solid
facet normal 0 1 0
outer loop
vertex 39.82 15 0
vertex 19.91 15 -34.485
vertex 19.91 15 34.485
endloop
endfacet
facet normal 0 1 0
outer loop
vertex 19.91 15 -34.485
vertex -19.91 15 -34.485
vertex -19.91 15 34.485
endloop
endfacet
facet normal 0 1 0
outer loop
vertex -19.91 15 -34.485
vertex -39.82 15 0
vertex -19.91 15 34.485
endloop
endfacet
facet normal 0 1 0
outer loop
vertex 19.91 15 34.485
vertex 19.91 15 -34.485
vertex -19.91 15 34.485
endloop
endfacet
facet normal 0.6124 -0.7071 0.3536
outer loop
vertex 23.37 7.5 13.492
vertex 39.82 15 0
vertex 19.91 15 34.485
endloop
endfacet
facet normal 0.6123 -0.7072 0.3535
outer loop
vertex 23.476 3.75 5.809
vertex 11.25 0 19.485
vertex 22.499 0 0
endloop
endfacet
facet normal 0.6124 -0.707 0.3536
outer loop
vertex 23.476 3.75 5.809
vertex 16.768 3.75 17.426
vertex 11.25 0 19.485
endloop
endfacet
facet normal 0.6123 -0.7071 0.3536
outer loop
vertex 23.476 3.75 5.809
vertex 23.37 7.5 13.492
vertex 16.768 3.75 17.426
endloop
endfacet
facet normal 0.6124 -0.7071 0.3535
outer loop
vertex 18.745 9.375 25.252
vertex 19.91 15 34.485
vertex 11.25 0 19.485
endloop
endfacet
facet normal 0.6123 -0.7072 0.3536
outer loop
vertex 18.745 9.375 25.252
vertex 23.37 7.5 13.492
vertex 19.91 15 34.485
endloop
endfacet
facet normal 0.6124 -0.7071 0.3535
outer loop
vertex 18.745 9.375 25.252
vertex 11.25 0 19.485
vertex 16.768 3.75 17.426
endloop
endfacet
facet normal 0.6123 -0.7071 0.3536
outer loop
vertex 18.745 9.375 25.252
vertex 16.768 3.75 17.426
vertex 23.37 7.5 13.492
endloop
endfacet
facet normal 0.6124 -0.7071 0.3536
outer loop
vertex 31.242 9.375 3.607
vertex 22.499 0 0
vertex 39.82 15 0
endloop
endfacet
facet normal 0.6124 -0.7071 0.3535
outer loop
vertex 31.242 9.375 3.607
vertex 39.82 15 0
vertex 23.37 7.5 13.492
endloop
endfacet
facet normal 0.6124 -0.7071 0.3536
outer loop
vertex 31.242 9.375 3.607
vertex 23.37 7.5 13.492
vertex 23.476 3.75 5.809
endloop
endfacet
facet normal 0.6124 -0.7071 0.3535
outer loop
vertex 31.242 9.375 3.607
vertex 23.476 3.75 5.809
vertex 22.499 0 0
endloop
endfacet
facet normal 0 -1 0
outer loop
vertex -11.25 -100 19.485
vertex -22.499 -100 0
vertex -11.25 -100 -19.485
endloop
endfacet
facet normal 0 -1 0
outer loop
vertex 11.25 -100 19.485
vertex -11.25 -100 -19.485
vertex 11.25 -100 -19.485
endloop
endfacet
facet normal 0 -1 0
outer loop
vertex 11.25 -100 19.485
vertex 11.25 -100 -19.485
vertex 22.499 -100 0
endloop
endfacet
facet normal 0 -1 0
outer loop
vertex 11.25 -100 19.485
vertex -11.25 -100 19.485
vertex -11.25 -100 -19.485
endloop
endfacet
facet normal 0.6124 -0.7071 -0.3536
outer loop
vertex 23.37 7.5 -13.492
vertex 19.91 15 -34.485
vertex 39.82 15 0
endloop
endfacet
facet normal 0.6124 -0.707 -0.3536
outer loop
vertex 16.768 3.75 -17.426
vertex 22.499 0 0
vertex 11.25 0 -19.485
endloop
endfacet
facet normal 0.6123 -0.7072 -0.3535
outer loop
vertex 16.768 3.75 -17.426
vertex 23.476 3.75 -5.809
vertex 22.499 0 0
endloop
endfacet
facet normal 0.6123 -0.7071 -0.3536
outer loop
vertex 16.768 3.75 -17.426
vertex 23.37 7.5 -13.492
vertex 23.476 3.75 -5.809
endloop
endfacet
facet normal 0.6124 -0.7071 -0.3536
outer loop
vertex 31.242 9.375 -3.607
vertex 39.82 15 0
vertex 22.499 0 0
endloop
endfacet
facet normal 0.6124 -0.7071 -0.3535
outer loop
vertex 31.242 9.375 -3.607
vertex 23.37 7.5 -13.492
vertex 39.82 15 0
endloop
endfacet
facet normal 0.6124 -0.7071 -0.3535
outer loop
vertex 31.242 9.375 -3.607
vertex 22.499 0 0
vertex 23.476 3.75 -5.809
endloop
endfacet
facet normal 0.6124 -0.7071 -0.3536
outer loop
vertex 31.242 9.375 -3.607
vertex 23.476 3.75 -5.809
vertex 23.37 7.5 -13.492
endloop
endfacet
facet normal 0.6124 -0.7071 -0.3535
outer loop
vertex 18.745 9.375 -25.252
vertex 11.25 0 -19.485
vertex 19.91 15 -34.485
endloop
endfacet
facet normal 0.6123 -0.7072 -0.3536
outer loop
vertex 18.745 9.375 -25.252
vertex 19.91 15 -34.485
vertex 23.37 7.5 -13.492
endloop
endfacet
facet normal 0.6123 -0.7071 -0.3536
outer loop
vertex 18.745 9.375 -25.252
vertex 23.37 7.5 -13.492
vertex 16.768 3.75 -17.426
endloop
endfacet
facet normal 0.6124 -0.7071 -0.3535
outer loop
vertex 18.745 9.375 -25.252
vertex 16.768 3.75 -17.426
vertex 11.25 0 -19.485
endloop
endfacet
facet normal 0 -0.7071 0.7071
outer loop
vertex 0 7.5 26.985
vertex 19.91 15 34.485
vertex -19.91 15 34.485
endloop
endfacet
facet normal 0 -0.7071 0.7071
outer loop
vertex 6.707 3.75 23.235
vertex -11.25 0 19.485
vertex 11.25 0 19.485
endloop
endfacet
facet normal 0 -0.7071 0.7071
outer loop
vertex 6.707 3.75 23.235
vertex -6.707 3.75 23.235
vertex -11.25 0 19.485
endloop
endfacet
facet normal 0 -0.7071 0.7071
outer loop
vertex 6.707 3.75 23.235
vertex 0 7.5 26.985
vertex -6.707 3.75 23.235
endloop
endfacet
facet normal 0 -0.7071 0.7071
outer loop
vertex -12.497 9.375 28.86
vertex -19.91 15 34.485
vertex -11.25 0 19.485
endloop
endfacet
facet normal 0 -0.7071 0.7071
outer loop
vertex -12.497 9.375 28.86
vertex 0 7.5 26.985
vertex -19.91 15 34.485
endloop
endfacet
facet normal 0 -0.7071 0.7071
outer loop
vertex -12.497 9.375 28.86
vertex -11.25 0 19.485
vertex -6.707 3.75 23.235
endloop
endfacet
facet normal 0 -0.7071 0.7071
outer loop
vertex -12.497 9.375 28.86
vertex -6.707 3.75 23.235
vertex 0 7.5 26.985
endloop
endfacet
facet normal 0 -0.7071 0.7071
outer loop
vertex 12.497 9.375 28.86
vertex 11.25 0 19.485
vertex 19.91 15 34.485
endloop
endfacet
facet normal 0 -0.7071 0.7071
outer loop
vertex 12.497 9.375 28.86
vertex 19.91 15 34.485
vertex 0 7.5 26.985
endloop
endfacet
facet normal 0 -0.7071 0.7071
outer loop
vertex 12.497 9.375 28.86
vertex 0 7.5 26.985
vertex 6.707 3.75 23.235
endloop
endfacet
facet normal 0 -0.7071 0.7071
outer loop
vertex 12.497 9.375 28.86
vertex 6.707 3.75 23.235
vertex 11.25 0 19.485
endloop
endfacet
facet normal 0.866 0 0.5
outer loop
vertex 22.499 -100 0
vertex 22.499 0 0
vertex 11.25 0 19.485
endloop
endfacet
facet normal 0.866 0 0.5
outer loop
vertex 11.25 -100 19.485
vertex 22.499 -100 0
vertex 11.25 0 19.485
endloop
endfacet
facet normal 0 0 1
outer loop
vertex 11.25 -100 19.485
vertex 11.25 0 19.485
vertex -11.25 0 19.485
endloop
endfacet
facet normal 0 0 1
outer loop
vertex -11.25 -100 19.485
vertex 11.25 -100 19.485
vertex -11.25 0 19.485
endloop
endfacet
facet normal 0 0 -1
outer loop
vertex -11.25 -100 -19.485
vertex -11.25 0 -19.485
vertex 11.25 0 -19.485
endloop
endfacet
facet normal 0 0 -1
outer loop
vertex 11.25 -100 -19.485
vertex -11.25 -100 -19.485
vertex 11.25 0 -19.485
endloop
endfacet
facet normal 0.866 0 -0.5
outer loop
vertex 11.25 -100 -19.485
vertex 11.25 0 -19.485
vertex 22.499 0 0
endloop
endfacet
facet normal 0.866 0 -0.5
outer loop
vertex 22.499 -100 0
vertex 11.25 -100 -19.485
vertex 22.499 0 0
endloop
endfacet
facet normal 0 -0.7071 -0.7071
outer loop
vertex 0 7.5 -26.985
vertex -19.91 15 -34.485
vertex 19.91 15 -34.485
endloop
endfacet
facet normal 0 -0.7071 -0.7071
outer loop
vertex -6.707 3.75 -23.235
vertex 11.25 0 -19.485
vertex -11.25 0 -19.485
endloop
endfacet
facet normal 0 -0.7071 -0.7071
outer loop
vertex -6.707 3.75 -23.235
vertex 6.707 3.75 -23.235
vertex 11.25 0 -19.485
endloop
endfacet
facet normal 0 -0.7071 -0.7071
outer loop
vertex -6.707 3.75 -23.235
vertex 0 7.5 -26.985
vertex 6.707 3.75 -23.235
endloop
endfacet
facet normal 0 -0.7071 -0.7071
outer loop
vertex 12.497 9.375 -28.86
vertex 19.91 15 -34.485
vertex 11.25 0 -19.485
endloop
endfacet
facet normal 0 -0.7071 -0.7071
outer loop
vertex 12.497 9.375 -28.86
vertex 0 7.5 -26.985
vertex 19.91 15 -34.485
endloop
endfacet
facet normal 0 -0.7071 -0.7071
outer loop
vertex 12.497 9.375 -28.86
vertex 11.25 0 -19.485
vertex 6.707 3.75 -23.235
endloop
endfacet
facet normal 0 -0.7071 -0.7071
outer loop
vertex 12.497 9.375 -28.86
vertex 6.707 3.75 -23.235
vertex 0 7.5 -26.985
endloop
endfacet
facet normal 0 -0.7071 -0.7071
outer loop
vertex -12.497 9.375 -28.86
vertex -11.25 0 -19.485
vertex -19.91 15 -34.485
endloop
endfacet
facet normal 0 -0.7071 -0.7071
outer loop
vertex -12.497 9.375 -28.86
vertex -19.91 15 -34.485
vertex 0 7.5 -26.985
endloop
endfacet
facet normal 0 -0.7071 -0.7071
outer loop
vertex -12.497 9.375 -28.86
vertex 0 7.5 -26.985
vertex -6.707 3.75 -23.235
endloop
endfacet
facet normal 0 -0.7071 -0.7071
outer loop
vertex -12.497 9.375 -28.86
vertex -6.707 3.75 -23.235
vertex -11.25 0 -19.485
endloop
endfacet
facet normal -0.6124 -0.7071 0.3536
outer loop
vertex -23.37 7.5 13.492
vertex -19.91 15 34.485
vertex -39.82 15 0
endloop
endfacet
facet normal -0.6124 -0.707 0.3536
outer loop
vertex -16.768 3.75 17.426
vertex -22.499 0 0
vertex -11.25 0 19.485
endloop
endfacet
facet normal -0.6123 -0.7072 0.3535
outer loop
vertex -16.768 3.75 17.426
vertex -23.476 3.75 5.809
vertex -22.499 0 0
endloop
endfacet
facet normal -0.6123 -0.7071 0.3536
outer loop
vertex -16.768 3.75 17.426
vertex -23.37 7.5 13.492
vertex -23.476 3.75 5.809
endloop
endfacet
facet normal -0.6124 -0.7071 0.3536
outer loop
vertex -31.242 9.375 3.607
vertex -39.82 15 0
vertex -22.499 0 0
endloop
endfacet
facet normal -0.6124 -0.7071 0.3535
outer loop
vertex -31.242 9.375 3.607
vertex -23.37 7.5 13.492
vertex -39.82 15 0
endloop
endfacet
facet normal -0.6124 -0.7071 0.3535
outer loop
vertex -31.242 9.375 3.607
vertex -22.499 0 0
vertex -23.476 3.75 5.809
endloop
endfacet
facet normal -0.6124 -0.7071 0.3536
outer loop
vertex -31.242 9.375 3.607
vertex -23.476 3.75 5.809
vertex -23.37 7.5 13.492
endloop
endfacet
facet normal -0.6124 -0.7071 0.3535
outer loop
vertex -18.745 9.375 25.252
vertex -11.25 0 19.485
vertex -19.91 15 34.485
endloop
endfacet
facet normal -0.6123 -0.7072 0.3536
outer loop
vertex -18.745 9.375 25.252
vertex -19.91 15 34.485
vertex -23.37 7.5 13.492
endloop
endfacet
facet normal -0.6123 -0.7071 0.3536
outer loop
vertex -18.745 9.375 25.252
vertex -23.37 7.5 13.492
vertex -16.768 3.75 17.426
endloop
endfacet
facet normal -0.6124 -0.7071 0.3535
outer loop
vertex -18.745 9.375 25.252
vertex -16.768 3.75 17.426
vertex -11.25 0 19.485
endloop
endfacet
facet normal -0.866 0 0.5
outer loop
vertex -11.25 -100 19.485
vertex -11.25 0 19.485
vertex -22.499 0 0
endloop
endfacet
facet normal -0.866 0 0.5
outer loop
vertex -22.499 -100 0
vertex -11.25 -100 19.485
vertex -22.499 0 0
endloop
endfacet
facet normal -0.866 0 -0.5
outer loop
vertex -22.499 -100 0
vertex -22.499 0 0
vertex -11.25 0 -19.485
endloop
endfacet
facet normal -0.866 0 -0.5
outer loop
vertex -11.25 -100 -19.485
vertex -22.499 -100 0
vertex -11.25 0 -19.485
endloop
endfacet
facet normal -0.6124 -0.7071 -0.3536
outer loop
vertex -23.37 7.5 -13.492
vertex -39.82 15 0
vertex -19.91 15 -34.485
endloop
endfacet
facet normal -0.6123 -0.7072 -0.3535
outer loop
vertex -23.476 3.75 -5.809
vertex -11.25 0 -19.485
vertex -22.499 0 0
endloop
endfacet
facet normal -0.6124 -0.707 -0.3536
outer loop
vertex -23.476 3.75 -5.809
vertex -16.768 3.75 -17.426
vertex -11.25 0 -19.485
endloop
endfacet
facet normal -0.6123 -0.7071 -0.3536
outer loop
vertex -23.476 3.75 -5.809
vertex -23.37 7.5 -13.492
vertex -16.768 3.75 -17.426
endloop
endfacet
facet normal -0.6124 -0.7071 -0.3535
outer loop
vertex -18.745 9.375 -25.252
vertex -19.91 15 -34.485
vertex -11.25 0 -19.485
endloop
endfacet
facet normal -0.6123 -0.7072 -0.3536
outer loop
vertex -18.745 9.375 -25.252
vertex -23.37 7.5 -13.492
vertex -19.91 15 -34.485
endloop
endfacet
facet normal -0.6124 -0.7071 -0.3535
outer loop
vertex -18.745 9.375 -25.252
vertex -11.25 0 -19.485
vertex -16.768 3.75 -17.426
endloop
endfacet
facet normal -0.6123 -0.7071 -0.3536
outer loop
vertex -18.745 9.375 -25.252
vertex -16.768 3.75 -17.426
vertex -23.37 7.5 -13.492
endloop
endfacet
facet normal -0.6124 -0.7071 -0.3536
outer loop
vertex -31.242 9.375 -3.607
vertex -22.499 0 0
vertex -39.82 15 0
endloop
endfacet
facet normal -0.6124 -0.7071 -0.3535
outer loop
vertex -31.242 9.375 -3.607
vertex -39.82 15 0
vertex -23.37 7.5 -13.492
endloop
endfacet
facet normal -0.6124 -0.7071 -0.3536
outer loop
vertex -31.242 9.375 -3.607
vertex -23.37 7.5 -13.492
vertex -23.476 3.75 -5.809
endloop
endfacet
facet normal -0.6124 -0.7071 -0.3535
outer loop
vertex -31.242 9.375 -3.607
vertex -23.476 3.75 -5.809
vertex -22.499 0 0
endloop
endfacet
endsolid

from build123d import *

# Parameters (mm, degrees)
F1_DEPTH = 100
F2_DEPTH = 15
F2_TAPER = -45


with BuildPart() as f1:
    # F0 (on Front) → F1 (new body)
    with BuildSketch(Plane.XZ):
        Polygon((-11.2495551893, -19.4848011505), (11.2495551893, -19.4848011505), (22.4991103787, 0), (11.2495551893, 19.4848011505), (-11.2495551893, 19.4848011505), (-22.4991103787, 0), align=None)
    extrude(amount=F1_DEPTH)

    # F1_face (on face) → F2 (join)
    with BuildSketch(Plane(origin=(0, 0, 0), x_dir=(1, 0, 0), z_dir=(0, 1, 0))):
        Polygon((-11.2495551893, 19.4848011505), (-22.4991103787, 0), (-11.2495551893, -19.4848011505), (11.2495551893, -19.4848011505), (22.4991103787, 0), (11.2495551893, 19.4848011505), align=None)
    extrude(amount=F2_DEPTH, taper=F2_TAPER)


solid = f1.part
